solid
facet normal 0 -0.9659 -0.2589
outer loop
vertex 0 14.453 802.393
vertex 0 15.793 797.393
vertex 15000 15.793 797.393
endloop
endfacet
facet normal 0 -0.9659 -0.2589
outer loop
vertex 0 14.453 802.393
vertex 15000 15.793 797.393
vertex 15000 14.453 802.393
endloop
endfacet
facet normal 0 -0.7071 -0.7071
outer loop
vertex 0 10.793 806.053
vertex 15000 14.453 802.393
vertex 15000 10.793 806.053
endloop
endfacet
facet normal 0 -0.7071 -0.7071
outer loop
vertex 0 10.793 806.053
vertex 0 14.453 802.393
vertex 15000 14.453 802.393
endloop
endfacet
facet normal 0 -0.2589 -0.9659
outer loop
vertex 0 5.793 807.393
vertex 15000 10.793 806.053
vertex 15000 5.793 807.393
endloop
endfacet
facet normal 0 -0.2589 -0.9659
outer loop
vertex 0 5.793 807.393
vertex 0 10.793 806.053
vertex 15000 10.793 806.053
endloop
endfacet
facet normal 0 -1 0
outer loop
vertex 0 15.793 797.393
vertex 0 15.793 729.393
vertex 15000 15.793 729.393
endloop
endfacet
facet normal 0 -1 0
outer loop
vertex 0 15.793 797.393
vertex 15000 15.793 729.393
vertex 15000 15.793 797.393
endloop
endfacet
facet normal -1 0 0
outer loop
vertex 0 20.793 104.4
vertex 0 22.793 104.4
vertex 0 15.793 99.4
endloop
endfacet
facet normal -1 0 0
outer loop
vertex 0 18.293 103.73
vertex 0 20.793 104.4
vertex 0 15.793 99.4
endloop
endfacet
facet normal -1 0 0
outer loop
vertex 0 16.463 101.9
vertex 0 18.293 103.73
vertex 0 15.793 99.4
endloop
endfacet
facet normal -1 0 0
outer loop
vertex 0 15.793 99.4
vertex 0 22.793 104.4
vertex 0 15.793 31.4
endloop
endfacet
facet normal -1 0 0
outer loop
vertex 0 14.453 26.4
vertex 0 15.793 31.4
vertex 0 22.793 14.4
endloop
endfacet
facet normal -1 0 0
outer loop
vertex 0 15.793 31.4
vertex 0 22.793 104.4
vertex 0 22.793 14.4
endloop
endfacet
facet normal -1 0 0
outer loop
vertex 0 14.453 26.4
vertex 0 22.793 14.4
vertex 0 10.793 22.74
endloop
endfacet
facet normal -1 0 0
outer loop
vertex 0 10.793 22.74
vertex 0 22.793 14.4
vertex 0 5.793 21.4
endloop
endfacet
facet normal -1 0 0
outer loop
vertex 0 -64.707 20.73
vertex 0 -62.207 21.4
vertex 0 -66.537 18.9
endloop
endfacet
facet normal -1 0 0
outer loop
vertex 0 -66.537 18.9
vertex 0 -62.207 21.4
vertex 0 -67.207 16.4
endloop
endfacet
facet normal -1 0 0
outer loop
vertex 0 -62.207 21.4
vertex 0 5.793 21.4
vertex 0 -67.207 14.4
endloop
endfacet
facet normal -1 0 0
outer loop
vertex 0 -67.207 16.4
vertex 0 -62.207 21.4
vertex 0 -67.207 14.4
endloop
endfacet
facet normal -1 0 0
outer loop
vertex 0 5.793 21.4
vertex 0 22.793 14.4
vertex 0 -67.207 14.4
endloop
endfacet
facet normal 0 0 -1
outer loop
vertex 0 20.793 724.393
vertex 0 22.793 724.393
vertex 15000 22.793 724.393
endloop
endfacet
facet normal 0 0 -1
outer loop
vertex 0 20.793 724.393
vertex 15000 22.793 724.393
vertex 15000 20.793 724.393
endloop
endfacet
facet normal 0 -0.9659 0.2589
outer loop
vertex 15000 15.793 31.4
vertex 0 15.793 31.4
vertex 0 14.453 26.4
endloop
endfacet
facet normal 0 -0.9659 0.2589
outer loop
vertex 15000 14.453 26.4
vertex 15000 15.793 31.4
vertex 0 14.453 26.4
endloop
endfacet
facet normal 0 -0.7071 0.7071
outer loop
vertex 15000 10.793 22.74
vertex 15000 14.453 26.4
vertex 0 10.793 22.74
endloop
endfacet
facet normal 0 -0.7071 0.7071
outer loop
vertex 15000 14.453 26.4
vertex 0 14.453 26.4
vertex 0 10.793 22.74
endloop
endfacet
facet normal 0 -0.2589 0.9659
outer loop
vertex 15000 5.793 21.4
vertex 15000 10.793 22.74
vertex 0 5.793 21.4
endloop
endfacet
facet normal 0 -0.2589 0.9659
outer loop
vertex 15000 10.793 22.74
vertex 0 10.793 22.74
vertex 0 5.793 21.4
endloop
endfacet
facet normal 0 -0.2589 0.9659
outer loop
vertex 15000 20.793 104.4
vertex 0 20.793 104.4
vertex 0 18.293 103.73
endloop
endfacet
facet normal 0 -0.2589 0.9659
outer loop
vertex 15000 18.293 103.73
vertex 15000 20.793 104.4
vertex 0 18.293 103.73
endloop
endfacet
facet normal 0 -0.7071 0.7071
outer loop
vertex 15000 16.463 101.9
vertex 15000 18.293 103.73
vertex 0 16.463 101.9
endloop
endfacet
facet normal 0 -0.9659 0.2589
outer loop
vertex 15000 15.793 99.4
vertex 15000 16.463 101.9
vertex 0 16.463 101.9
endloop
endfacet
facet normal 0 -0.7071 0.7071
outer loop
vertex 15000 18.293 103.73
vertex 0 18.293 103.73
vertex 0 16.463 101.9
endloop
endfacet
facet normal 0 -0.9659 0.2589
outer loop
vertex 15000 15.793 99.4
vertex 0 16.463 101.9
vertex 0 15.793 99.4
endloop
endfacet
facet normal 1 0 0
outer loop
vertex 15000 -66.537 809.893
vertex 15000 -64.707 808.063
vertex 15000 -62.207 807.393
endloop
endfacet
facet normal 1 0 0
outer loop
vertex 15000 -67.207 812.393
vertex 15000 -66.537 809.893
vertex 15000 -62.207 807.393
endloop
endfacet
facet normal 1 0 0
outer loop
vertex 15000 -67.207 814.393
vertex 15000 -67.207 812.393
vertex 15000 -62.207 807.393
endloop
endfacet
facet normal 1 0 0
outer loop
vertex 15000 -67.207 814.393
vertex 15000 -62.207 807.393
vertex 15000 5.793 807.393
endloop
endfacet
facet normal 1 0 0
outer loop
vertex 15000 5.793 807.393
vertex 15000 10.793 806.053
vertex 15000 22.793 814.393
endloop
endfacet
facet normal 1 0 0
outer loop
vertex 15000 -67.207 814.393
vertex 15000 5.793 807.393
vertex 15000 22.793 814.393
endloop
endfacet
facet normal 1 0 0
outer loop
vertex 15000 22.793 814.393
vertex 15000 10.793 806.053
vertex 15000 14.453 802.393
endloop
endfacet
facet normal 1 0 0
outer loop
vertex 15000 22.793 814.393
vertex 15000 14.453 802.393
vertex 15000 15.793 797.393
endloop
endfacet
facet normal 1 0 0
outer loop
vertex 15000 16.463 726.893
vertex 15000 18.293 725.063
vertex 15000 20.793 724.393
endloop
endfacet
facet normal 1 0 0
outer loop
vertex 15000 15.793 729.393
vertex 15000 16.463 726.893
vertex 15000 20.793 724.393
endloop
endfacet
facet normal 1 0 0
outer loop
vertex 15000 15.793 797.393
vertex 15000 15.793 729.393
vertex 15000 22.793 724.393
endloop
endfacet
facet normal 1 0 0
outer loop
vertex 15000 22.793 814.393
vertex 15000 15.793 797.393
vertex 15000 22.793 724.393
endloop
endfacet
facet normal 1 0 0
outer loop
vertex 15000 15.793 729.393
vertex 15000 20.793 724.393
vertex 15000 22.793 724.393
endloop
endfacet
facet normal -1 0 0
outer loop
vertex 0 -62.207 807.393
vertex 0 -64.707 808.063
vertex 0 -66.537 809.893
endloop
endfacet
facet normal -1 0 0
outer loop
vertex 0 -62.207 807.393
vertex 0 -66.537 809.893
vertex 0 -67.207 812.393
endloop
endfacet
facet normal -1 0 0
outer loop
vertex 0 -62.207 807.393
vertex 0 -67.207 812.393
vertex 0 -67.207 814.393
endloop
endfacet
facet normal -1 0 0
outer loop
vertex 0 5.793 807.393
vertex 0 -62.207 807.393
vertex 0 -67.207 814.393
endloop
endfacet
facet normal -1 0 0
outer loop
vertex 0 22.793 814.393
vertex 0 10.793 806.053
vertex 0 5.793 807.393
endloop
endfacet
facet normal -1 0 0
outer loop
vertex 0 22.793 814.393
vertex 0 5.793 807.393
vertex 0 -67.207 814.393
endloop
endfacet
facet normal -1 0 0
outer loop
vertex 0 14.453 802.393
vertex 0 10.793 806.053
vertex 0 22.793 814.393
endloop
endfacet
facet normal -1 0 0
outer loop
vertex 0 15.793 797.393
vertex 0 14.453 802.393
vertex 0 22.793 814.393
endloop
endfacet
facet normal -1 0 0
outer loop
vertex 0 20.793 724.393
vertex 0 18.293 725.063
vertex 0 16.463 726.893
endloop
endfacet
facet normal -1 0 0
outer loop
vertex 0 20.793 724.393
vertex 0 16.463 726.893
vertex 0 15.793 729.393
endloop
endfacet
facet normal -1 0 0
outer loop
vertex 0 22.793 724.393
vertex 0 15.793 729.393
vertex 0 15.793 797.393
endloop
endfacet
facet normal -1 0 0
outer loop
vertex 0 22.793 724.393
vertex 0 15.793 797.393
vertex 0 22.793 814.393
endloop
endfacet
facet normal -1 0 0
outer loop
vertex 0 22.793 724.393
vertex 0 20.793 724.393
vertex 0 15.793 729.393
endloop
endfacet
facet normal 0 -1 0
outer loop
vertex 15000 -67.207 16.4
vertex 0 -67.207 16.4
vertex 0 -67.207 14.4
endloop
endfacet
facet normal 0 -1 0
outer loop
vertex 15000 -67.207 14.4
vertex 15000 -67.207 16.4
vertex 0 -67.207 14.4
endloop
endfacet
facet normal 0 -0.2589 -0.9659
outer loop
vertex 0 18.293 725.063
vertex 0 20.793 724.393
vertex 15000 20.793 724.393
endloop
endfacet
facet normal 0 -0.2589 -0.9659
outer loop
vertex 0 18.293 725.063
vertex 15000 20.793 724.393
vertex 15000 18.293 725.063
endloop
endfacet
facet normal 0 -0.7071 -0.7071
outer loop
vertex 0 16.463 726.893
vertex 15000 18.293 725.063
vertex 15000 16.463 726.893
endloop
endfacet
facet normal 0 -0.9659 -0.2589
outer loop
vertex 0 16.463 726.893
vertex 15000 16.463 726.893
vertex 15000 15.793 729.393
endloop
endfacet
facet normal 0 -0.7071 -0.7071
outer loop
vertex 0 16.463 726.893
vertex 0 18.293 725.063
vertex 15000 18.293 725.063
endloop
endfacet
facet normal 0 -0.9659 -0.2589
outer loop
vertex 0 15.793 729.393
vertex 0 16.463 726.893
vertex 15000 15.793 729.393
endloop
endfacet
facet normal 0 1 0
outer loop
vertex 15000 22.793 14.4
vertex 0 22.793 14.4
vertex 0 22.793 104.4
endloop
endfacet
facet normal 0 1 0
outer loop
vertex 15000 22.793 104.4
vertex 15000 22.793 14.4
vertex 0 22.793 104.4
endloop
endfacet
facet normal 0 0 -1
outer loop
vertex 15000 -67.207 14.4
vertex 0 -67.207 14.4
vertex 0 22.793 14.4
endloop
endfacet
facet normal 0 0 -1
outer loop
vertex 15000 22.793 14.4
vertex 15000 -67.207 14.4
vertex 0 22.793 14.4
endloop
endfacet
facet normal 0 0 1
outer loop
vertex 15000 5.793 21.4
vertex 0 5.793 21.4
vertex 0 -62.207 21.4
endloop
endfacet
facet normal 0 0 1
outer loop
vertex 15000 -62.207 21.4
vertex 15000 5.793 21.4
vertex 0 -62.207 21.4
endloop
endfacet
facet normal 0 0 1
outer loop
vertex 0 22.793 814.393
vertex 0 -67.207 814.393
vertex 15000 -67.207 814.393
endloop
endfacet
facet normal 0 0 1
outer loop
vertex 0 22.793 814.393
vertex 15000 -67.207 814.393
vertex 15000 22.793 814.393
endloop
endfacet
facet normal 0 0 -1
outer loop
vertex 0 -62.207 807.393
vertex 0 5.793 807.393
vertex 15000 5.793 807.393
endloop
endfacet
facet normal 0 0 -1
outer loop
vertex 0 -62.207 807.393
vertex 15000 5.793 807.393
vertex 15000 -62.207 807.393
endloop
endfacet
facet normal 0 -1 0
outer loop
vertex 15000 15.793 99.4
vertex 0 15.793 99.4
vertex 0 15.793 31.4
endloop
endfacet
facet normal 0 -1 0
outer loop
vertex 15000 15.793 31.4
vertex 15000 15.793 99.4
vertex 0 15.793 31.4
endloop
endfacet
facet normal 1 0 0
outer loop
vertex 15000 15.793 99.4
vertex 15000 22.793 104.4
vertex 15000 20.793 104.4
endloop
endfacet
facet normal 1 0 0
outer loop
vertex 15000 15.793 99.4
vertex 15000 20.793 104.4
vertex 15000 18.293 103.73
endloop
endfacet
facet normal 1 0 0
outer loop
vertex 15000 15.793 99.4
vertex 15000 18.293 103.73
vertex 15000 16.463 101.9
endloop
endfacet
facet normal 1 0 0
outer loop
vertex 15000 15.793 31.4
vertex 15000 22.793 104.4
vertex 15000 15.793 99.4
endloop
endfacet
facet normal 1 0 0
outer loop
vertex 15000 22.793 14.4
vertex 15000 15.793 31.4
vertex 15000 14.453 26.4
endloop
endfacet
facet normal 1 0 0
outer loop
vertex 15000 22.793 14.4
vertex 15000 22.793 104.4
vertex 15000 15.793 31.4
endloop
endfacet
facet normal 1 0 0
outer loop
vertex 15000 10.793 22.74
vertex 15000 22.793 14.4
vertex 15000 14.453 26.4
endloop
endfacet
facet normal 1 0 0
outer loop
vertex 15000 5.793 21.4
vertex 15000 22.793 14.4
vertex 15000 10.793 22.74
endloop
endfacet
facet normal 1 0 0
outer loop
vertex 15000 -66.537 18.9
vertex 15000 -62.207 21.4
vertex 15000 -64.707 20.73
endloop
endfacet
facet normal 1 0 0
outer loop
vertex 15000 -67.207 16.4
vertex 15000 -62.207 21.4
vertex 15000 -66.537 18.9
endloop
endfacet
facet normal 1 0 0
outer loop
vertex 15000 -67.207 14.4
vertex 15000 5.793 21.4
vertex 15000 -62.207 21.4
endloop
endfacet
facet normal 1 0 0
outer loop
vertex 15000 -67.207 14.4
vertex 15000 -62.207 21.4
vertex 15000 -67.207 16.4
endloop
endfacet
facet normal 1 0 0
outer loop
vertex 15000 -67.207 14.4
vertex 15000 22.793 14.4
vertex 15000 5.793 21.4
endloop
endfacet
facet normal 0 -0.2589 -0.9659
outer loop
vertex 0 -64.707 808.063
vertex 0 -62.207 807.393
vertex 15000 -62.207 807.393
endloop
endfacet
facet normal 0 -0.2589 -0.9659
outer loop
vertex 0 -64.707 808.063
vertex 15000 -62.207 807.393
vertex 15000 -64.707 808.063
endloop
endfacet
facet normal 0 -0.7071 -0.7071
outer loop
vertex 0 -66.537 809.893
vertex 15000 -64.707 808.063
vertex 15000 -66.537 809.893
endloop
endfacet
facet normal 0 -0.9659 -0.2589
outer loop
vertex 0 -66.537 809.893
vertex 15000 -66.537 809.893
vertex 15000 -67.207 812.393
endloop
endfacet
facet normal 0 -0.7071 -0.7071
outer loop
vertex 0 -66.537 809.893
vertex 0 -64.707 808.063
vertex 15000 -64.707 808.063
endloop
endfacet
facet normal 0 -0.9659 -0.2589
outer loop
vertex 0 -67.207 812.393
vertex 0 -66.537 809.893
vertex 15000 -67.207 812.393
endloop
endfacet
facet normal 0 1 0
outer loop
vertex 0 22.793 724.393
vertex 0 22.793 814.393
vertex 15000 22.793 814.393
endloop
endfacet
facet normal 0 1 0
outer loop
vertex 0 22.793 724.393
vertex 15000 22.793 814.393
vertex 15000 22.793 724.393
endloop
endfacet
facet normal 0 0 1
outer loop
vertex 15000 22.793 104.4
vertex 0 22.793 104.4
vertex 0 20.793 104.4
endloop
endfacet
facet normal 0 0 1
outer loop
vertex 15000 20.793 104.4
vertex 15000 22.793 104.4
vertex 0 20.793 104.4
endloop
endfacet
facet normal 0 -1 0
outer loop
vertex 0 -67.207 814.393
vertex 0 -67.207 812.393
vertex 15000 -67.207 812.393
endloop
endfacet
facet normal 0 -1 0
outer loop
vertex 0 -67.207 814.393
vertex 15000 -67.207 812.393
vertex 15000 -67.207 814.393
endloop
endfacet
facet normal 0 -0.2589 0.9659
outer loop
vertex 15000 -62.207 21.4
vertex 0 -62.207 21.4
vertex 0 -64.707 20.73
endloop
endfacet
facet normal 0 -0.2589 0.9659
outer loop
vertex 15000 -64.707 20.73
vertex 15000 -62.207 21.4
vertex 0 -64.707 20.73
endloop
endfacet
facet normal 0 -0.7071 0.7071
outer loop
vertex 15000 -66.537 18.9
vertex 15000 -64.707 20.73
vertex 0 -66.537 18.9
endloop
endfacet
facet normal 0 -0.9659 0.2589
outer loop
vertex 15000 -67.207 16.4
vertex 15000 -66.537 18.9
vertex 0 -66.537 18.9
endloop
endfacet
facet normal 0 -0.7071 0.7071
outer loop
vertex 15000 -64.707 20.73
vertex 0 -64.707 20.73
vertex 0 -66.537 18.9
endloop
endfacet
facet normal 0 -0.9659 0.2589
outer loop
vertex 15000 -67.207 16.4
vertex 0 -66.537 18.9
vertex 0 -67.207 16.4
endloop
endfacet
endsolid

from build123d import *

# Parameters (mm, degrees)
EXTRUDE017_DEPTH = 15000
EXTRUDE018_DEPTH = 15000


with BuildPart() as extrude017:
    # AngleSteel004 → Extrude017 (new body)
    with BuildSketch(Plane(origin=(0, 53.415282, 39.015282), x_dir=(0, 1, 0), z_dir=(-1, 0, 0))):
        with BuildLine():
            Line((-24.615282, 24.615282), (-24.615282, -65.384718))
            Line((-24.615282, -65.384718), (-22.615282, -65.384718))
            ThreePointArc((-22.615282, -65.384718), (-19.079748, -63.920252), (-17.615282, -60.384718))
            Line((-17.615282, -60.384718), (-17.615282, 7.615282))
            ThreePointArc((-17.615282, 7.615282), (-14.68635, 14.68635), (-7.615282, 17.615282))
            Line((-7.615282, 17.615282), (60.384718, 17.615282))
            ThreePointArc((60.384718, 17.615282), (63.920252, 19.079748), (65.384718, 22.615282))
            Line((65.384718, 22.615282), (65.384718, 24.615282))
            Line((65.384718, 24.615282), (-24.615282, 24.615282))
        make_face()
    extrude(amount=-EXTRUDE017_DEPTH)


with BuildPart() as fusion001:
    # Mirror → Extrude018 (new body)
    with BuildSketch(Plane(origin=(0, 53.415282, 789.777402), x_dir=(0, -1, 0), z_dir=(1, 0, 0))):
        with BuildLine():
            Line((24.615282, -24.615282), (24.615282, 65.384718))
            Line((24.615282, 65.384718), (22.615282, 65.384718))
            ThreePointArc((22.615282, 65.384718), (19.079748, 63.920252), (17.615282, 60.384718))
            Line((17.615282, 60.384718), (17.615282, -7.615282))
            ThreePointArc((17.615282, -7.615282), (14.68635, -14.68635), (7.615282, -17.615282))
            Line((7.615282, -17.615282), (-60.384718, -17.615282))
            ThreePointArc((-60.384718, -17.615282), (-63.920252, -19.079748), (-65.384718, -22.615282))
            Line((-65.384718, -22.615282), (-65.384718, -24.615282))
            Line((-65.384718, -24.615282), (24.615282, -24.615282))
        make_face()
    extrude(amount=EXTRUDE018_DEPTH)

    # Fusion001: union Extrude017
    add(extrude017.part)


with BuildPart() as fusion_mirrored:
    # Mirror001: instance of Fusion001
    add(fusion001.part.mirror(Plane(origin=(0, 28.796342, 514.396342), x_dir=(-1, 0, 0), z_dir=(0, -1, 0))))


with BuildPart() as fusion_mirrored_1:
    # Mirror001 placement: moved
    add(fusion_mirrored.part.moved(Location((0, -6, 0))))


solid = fusion_mirrored_1.part
